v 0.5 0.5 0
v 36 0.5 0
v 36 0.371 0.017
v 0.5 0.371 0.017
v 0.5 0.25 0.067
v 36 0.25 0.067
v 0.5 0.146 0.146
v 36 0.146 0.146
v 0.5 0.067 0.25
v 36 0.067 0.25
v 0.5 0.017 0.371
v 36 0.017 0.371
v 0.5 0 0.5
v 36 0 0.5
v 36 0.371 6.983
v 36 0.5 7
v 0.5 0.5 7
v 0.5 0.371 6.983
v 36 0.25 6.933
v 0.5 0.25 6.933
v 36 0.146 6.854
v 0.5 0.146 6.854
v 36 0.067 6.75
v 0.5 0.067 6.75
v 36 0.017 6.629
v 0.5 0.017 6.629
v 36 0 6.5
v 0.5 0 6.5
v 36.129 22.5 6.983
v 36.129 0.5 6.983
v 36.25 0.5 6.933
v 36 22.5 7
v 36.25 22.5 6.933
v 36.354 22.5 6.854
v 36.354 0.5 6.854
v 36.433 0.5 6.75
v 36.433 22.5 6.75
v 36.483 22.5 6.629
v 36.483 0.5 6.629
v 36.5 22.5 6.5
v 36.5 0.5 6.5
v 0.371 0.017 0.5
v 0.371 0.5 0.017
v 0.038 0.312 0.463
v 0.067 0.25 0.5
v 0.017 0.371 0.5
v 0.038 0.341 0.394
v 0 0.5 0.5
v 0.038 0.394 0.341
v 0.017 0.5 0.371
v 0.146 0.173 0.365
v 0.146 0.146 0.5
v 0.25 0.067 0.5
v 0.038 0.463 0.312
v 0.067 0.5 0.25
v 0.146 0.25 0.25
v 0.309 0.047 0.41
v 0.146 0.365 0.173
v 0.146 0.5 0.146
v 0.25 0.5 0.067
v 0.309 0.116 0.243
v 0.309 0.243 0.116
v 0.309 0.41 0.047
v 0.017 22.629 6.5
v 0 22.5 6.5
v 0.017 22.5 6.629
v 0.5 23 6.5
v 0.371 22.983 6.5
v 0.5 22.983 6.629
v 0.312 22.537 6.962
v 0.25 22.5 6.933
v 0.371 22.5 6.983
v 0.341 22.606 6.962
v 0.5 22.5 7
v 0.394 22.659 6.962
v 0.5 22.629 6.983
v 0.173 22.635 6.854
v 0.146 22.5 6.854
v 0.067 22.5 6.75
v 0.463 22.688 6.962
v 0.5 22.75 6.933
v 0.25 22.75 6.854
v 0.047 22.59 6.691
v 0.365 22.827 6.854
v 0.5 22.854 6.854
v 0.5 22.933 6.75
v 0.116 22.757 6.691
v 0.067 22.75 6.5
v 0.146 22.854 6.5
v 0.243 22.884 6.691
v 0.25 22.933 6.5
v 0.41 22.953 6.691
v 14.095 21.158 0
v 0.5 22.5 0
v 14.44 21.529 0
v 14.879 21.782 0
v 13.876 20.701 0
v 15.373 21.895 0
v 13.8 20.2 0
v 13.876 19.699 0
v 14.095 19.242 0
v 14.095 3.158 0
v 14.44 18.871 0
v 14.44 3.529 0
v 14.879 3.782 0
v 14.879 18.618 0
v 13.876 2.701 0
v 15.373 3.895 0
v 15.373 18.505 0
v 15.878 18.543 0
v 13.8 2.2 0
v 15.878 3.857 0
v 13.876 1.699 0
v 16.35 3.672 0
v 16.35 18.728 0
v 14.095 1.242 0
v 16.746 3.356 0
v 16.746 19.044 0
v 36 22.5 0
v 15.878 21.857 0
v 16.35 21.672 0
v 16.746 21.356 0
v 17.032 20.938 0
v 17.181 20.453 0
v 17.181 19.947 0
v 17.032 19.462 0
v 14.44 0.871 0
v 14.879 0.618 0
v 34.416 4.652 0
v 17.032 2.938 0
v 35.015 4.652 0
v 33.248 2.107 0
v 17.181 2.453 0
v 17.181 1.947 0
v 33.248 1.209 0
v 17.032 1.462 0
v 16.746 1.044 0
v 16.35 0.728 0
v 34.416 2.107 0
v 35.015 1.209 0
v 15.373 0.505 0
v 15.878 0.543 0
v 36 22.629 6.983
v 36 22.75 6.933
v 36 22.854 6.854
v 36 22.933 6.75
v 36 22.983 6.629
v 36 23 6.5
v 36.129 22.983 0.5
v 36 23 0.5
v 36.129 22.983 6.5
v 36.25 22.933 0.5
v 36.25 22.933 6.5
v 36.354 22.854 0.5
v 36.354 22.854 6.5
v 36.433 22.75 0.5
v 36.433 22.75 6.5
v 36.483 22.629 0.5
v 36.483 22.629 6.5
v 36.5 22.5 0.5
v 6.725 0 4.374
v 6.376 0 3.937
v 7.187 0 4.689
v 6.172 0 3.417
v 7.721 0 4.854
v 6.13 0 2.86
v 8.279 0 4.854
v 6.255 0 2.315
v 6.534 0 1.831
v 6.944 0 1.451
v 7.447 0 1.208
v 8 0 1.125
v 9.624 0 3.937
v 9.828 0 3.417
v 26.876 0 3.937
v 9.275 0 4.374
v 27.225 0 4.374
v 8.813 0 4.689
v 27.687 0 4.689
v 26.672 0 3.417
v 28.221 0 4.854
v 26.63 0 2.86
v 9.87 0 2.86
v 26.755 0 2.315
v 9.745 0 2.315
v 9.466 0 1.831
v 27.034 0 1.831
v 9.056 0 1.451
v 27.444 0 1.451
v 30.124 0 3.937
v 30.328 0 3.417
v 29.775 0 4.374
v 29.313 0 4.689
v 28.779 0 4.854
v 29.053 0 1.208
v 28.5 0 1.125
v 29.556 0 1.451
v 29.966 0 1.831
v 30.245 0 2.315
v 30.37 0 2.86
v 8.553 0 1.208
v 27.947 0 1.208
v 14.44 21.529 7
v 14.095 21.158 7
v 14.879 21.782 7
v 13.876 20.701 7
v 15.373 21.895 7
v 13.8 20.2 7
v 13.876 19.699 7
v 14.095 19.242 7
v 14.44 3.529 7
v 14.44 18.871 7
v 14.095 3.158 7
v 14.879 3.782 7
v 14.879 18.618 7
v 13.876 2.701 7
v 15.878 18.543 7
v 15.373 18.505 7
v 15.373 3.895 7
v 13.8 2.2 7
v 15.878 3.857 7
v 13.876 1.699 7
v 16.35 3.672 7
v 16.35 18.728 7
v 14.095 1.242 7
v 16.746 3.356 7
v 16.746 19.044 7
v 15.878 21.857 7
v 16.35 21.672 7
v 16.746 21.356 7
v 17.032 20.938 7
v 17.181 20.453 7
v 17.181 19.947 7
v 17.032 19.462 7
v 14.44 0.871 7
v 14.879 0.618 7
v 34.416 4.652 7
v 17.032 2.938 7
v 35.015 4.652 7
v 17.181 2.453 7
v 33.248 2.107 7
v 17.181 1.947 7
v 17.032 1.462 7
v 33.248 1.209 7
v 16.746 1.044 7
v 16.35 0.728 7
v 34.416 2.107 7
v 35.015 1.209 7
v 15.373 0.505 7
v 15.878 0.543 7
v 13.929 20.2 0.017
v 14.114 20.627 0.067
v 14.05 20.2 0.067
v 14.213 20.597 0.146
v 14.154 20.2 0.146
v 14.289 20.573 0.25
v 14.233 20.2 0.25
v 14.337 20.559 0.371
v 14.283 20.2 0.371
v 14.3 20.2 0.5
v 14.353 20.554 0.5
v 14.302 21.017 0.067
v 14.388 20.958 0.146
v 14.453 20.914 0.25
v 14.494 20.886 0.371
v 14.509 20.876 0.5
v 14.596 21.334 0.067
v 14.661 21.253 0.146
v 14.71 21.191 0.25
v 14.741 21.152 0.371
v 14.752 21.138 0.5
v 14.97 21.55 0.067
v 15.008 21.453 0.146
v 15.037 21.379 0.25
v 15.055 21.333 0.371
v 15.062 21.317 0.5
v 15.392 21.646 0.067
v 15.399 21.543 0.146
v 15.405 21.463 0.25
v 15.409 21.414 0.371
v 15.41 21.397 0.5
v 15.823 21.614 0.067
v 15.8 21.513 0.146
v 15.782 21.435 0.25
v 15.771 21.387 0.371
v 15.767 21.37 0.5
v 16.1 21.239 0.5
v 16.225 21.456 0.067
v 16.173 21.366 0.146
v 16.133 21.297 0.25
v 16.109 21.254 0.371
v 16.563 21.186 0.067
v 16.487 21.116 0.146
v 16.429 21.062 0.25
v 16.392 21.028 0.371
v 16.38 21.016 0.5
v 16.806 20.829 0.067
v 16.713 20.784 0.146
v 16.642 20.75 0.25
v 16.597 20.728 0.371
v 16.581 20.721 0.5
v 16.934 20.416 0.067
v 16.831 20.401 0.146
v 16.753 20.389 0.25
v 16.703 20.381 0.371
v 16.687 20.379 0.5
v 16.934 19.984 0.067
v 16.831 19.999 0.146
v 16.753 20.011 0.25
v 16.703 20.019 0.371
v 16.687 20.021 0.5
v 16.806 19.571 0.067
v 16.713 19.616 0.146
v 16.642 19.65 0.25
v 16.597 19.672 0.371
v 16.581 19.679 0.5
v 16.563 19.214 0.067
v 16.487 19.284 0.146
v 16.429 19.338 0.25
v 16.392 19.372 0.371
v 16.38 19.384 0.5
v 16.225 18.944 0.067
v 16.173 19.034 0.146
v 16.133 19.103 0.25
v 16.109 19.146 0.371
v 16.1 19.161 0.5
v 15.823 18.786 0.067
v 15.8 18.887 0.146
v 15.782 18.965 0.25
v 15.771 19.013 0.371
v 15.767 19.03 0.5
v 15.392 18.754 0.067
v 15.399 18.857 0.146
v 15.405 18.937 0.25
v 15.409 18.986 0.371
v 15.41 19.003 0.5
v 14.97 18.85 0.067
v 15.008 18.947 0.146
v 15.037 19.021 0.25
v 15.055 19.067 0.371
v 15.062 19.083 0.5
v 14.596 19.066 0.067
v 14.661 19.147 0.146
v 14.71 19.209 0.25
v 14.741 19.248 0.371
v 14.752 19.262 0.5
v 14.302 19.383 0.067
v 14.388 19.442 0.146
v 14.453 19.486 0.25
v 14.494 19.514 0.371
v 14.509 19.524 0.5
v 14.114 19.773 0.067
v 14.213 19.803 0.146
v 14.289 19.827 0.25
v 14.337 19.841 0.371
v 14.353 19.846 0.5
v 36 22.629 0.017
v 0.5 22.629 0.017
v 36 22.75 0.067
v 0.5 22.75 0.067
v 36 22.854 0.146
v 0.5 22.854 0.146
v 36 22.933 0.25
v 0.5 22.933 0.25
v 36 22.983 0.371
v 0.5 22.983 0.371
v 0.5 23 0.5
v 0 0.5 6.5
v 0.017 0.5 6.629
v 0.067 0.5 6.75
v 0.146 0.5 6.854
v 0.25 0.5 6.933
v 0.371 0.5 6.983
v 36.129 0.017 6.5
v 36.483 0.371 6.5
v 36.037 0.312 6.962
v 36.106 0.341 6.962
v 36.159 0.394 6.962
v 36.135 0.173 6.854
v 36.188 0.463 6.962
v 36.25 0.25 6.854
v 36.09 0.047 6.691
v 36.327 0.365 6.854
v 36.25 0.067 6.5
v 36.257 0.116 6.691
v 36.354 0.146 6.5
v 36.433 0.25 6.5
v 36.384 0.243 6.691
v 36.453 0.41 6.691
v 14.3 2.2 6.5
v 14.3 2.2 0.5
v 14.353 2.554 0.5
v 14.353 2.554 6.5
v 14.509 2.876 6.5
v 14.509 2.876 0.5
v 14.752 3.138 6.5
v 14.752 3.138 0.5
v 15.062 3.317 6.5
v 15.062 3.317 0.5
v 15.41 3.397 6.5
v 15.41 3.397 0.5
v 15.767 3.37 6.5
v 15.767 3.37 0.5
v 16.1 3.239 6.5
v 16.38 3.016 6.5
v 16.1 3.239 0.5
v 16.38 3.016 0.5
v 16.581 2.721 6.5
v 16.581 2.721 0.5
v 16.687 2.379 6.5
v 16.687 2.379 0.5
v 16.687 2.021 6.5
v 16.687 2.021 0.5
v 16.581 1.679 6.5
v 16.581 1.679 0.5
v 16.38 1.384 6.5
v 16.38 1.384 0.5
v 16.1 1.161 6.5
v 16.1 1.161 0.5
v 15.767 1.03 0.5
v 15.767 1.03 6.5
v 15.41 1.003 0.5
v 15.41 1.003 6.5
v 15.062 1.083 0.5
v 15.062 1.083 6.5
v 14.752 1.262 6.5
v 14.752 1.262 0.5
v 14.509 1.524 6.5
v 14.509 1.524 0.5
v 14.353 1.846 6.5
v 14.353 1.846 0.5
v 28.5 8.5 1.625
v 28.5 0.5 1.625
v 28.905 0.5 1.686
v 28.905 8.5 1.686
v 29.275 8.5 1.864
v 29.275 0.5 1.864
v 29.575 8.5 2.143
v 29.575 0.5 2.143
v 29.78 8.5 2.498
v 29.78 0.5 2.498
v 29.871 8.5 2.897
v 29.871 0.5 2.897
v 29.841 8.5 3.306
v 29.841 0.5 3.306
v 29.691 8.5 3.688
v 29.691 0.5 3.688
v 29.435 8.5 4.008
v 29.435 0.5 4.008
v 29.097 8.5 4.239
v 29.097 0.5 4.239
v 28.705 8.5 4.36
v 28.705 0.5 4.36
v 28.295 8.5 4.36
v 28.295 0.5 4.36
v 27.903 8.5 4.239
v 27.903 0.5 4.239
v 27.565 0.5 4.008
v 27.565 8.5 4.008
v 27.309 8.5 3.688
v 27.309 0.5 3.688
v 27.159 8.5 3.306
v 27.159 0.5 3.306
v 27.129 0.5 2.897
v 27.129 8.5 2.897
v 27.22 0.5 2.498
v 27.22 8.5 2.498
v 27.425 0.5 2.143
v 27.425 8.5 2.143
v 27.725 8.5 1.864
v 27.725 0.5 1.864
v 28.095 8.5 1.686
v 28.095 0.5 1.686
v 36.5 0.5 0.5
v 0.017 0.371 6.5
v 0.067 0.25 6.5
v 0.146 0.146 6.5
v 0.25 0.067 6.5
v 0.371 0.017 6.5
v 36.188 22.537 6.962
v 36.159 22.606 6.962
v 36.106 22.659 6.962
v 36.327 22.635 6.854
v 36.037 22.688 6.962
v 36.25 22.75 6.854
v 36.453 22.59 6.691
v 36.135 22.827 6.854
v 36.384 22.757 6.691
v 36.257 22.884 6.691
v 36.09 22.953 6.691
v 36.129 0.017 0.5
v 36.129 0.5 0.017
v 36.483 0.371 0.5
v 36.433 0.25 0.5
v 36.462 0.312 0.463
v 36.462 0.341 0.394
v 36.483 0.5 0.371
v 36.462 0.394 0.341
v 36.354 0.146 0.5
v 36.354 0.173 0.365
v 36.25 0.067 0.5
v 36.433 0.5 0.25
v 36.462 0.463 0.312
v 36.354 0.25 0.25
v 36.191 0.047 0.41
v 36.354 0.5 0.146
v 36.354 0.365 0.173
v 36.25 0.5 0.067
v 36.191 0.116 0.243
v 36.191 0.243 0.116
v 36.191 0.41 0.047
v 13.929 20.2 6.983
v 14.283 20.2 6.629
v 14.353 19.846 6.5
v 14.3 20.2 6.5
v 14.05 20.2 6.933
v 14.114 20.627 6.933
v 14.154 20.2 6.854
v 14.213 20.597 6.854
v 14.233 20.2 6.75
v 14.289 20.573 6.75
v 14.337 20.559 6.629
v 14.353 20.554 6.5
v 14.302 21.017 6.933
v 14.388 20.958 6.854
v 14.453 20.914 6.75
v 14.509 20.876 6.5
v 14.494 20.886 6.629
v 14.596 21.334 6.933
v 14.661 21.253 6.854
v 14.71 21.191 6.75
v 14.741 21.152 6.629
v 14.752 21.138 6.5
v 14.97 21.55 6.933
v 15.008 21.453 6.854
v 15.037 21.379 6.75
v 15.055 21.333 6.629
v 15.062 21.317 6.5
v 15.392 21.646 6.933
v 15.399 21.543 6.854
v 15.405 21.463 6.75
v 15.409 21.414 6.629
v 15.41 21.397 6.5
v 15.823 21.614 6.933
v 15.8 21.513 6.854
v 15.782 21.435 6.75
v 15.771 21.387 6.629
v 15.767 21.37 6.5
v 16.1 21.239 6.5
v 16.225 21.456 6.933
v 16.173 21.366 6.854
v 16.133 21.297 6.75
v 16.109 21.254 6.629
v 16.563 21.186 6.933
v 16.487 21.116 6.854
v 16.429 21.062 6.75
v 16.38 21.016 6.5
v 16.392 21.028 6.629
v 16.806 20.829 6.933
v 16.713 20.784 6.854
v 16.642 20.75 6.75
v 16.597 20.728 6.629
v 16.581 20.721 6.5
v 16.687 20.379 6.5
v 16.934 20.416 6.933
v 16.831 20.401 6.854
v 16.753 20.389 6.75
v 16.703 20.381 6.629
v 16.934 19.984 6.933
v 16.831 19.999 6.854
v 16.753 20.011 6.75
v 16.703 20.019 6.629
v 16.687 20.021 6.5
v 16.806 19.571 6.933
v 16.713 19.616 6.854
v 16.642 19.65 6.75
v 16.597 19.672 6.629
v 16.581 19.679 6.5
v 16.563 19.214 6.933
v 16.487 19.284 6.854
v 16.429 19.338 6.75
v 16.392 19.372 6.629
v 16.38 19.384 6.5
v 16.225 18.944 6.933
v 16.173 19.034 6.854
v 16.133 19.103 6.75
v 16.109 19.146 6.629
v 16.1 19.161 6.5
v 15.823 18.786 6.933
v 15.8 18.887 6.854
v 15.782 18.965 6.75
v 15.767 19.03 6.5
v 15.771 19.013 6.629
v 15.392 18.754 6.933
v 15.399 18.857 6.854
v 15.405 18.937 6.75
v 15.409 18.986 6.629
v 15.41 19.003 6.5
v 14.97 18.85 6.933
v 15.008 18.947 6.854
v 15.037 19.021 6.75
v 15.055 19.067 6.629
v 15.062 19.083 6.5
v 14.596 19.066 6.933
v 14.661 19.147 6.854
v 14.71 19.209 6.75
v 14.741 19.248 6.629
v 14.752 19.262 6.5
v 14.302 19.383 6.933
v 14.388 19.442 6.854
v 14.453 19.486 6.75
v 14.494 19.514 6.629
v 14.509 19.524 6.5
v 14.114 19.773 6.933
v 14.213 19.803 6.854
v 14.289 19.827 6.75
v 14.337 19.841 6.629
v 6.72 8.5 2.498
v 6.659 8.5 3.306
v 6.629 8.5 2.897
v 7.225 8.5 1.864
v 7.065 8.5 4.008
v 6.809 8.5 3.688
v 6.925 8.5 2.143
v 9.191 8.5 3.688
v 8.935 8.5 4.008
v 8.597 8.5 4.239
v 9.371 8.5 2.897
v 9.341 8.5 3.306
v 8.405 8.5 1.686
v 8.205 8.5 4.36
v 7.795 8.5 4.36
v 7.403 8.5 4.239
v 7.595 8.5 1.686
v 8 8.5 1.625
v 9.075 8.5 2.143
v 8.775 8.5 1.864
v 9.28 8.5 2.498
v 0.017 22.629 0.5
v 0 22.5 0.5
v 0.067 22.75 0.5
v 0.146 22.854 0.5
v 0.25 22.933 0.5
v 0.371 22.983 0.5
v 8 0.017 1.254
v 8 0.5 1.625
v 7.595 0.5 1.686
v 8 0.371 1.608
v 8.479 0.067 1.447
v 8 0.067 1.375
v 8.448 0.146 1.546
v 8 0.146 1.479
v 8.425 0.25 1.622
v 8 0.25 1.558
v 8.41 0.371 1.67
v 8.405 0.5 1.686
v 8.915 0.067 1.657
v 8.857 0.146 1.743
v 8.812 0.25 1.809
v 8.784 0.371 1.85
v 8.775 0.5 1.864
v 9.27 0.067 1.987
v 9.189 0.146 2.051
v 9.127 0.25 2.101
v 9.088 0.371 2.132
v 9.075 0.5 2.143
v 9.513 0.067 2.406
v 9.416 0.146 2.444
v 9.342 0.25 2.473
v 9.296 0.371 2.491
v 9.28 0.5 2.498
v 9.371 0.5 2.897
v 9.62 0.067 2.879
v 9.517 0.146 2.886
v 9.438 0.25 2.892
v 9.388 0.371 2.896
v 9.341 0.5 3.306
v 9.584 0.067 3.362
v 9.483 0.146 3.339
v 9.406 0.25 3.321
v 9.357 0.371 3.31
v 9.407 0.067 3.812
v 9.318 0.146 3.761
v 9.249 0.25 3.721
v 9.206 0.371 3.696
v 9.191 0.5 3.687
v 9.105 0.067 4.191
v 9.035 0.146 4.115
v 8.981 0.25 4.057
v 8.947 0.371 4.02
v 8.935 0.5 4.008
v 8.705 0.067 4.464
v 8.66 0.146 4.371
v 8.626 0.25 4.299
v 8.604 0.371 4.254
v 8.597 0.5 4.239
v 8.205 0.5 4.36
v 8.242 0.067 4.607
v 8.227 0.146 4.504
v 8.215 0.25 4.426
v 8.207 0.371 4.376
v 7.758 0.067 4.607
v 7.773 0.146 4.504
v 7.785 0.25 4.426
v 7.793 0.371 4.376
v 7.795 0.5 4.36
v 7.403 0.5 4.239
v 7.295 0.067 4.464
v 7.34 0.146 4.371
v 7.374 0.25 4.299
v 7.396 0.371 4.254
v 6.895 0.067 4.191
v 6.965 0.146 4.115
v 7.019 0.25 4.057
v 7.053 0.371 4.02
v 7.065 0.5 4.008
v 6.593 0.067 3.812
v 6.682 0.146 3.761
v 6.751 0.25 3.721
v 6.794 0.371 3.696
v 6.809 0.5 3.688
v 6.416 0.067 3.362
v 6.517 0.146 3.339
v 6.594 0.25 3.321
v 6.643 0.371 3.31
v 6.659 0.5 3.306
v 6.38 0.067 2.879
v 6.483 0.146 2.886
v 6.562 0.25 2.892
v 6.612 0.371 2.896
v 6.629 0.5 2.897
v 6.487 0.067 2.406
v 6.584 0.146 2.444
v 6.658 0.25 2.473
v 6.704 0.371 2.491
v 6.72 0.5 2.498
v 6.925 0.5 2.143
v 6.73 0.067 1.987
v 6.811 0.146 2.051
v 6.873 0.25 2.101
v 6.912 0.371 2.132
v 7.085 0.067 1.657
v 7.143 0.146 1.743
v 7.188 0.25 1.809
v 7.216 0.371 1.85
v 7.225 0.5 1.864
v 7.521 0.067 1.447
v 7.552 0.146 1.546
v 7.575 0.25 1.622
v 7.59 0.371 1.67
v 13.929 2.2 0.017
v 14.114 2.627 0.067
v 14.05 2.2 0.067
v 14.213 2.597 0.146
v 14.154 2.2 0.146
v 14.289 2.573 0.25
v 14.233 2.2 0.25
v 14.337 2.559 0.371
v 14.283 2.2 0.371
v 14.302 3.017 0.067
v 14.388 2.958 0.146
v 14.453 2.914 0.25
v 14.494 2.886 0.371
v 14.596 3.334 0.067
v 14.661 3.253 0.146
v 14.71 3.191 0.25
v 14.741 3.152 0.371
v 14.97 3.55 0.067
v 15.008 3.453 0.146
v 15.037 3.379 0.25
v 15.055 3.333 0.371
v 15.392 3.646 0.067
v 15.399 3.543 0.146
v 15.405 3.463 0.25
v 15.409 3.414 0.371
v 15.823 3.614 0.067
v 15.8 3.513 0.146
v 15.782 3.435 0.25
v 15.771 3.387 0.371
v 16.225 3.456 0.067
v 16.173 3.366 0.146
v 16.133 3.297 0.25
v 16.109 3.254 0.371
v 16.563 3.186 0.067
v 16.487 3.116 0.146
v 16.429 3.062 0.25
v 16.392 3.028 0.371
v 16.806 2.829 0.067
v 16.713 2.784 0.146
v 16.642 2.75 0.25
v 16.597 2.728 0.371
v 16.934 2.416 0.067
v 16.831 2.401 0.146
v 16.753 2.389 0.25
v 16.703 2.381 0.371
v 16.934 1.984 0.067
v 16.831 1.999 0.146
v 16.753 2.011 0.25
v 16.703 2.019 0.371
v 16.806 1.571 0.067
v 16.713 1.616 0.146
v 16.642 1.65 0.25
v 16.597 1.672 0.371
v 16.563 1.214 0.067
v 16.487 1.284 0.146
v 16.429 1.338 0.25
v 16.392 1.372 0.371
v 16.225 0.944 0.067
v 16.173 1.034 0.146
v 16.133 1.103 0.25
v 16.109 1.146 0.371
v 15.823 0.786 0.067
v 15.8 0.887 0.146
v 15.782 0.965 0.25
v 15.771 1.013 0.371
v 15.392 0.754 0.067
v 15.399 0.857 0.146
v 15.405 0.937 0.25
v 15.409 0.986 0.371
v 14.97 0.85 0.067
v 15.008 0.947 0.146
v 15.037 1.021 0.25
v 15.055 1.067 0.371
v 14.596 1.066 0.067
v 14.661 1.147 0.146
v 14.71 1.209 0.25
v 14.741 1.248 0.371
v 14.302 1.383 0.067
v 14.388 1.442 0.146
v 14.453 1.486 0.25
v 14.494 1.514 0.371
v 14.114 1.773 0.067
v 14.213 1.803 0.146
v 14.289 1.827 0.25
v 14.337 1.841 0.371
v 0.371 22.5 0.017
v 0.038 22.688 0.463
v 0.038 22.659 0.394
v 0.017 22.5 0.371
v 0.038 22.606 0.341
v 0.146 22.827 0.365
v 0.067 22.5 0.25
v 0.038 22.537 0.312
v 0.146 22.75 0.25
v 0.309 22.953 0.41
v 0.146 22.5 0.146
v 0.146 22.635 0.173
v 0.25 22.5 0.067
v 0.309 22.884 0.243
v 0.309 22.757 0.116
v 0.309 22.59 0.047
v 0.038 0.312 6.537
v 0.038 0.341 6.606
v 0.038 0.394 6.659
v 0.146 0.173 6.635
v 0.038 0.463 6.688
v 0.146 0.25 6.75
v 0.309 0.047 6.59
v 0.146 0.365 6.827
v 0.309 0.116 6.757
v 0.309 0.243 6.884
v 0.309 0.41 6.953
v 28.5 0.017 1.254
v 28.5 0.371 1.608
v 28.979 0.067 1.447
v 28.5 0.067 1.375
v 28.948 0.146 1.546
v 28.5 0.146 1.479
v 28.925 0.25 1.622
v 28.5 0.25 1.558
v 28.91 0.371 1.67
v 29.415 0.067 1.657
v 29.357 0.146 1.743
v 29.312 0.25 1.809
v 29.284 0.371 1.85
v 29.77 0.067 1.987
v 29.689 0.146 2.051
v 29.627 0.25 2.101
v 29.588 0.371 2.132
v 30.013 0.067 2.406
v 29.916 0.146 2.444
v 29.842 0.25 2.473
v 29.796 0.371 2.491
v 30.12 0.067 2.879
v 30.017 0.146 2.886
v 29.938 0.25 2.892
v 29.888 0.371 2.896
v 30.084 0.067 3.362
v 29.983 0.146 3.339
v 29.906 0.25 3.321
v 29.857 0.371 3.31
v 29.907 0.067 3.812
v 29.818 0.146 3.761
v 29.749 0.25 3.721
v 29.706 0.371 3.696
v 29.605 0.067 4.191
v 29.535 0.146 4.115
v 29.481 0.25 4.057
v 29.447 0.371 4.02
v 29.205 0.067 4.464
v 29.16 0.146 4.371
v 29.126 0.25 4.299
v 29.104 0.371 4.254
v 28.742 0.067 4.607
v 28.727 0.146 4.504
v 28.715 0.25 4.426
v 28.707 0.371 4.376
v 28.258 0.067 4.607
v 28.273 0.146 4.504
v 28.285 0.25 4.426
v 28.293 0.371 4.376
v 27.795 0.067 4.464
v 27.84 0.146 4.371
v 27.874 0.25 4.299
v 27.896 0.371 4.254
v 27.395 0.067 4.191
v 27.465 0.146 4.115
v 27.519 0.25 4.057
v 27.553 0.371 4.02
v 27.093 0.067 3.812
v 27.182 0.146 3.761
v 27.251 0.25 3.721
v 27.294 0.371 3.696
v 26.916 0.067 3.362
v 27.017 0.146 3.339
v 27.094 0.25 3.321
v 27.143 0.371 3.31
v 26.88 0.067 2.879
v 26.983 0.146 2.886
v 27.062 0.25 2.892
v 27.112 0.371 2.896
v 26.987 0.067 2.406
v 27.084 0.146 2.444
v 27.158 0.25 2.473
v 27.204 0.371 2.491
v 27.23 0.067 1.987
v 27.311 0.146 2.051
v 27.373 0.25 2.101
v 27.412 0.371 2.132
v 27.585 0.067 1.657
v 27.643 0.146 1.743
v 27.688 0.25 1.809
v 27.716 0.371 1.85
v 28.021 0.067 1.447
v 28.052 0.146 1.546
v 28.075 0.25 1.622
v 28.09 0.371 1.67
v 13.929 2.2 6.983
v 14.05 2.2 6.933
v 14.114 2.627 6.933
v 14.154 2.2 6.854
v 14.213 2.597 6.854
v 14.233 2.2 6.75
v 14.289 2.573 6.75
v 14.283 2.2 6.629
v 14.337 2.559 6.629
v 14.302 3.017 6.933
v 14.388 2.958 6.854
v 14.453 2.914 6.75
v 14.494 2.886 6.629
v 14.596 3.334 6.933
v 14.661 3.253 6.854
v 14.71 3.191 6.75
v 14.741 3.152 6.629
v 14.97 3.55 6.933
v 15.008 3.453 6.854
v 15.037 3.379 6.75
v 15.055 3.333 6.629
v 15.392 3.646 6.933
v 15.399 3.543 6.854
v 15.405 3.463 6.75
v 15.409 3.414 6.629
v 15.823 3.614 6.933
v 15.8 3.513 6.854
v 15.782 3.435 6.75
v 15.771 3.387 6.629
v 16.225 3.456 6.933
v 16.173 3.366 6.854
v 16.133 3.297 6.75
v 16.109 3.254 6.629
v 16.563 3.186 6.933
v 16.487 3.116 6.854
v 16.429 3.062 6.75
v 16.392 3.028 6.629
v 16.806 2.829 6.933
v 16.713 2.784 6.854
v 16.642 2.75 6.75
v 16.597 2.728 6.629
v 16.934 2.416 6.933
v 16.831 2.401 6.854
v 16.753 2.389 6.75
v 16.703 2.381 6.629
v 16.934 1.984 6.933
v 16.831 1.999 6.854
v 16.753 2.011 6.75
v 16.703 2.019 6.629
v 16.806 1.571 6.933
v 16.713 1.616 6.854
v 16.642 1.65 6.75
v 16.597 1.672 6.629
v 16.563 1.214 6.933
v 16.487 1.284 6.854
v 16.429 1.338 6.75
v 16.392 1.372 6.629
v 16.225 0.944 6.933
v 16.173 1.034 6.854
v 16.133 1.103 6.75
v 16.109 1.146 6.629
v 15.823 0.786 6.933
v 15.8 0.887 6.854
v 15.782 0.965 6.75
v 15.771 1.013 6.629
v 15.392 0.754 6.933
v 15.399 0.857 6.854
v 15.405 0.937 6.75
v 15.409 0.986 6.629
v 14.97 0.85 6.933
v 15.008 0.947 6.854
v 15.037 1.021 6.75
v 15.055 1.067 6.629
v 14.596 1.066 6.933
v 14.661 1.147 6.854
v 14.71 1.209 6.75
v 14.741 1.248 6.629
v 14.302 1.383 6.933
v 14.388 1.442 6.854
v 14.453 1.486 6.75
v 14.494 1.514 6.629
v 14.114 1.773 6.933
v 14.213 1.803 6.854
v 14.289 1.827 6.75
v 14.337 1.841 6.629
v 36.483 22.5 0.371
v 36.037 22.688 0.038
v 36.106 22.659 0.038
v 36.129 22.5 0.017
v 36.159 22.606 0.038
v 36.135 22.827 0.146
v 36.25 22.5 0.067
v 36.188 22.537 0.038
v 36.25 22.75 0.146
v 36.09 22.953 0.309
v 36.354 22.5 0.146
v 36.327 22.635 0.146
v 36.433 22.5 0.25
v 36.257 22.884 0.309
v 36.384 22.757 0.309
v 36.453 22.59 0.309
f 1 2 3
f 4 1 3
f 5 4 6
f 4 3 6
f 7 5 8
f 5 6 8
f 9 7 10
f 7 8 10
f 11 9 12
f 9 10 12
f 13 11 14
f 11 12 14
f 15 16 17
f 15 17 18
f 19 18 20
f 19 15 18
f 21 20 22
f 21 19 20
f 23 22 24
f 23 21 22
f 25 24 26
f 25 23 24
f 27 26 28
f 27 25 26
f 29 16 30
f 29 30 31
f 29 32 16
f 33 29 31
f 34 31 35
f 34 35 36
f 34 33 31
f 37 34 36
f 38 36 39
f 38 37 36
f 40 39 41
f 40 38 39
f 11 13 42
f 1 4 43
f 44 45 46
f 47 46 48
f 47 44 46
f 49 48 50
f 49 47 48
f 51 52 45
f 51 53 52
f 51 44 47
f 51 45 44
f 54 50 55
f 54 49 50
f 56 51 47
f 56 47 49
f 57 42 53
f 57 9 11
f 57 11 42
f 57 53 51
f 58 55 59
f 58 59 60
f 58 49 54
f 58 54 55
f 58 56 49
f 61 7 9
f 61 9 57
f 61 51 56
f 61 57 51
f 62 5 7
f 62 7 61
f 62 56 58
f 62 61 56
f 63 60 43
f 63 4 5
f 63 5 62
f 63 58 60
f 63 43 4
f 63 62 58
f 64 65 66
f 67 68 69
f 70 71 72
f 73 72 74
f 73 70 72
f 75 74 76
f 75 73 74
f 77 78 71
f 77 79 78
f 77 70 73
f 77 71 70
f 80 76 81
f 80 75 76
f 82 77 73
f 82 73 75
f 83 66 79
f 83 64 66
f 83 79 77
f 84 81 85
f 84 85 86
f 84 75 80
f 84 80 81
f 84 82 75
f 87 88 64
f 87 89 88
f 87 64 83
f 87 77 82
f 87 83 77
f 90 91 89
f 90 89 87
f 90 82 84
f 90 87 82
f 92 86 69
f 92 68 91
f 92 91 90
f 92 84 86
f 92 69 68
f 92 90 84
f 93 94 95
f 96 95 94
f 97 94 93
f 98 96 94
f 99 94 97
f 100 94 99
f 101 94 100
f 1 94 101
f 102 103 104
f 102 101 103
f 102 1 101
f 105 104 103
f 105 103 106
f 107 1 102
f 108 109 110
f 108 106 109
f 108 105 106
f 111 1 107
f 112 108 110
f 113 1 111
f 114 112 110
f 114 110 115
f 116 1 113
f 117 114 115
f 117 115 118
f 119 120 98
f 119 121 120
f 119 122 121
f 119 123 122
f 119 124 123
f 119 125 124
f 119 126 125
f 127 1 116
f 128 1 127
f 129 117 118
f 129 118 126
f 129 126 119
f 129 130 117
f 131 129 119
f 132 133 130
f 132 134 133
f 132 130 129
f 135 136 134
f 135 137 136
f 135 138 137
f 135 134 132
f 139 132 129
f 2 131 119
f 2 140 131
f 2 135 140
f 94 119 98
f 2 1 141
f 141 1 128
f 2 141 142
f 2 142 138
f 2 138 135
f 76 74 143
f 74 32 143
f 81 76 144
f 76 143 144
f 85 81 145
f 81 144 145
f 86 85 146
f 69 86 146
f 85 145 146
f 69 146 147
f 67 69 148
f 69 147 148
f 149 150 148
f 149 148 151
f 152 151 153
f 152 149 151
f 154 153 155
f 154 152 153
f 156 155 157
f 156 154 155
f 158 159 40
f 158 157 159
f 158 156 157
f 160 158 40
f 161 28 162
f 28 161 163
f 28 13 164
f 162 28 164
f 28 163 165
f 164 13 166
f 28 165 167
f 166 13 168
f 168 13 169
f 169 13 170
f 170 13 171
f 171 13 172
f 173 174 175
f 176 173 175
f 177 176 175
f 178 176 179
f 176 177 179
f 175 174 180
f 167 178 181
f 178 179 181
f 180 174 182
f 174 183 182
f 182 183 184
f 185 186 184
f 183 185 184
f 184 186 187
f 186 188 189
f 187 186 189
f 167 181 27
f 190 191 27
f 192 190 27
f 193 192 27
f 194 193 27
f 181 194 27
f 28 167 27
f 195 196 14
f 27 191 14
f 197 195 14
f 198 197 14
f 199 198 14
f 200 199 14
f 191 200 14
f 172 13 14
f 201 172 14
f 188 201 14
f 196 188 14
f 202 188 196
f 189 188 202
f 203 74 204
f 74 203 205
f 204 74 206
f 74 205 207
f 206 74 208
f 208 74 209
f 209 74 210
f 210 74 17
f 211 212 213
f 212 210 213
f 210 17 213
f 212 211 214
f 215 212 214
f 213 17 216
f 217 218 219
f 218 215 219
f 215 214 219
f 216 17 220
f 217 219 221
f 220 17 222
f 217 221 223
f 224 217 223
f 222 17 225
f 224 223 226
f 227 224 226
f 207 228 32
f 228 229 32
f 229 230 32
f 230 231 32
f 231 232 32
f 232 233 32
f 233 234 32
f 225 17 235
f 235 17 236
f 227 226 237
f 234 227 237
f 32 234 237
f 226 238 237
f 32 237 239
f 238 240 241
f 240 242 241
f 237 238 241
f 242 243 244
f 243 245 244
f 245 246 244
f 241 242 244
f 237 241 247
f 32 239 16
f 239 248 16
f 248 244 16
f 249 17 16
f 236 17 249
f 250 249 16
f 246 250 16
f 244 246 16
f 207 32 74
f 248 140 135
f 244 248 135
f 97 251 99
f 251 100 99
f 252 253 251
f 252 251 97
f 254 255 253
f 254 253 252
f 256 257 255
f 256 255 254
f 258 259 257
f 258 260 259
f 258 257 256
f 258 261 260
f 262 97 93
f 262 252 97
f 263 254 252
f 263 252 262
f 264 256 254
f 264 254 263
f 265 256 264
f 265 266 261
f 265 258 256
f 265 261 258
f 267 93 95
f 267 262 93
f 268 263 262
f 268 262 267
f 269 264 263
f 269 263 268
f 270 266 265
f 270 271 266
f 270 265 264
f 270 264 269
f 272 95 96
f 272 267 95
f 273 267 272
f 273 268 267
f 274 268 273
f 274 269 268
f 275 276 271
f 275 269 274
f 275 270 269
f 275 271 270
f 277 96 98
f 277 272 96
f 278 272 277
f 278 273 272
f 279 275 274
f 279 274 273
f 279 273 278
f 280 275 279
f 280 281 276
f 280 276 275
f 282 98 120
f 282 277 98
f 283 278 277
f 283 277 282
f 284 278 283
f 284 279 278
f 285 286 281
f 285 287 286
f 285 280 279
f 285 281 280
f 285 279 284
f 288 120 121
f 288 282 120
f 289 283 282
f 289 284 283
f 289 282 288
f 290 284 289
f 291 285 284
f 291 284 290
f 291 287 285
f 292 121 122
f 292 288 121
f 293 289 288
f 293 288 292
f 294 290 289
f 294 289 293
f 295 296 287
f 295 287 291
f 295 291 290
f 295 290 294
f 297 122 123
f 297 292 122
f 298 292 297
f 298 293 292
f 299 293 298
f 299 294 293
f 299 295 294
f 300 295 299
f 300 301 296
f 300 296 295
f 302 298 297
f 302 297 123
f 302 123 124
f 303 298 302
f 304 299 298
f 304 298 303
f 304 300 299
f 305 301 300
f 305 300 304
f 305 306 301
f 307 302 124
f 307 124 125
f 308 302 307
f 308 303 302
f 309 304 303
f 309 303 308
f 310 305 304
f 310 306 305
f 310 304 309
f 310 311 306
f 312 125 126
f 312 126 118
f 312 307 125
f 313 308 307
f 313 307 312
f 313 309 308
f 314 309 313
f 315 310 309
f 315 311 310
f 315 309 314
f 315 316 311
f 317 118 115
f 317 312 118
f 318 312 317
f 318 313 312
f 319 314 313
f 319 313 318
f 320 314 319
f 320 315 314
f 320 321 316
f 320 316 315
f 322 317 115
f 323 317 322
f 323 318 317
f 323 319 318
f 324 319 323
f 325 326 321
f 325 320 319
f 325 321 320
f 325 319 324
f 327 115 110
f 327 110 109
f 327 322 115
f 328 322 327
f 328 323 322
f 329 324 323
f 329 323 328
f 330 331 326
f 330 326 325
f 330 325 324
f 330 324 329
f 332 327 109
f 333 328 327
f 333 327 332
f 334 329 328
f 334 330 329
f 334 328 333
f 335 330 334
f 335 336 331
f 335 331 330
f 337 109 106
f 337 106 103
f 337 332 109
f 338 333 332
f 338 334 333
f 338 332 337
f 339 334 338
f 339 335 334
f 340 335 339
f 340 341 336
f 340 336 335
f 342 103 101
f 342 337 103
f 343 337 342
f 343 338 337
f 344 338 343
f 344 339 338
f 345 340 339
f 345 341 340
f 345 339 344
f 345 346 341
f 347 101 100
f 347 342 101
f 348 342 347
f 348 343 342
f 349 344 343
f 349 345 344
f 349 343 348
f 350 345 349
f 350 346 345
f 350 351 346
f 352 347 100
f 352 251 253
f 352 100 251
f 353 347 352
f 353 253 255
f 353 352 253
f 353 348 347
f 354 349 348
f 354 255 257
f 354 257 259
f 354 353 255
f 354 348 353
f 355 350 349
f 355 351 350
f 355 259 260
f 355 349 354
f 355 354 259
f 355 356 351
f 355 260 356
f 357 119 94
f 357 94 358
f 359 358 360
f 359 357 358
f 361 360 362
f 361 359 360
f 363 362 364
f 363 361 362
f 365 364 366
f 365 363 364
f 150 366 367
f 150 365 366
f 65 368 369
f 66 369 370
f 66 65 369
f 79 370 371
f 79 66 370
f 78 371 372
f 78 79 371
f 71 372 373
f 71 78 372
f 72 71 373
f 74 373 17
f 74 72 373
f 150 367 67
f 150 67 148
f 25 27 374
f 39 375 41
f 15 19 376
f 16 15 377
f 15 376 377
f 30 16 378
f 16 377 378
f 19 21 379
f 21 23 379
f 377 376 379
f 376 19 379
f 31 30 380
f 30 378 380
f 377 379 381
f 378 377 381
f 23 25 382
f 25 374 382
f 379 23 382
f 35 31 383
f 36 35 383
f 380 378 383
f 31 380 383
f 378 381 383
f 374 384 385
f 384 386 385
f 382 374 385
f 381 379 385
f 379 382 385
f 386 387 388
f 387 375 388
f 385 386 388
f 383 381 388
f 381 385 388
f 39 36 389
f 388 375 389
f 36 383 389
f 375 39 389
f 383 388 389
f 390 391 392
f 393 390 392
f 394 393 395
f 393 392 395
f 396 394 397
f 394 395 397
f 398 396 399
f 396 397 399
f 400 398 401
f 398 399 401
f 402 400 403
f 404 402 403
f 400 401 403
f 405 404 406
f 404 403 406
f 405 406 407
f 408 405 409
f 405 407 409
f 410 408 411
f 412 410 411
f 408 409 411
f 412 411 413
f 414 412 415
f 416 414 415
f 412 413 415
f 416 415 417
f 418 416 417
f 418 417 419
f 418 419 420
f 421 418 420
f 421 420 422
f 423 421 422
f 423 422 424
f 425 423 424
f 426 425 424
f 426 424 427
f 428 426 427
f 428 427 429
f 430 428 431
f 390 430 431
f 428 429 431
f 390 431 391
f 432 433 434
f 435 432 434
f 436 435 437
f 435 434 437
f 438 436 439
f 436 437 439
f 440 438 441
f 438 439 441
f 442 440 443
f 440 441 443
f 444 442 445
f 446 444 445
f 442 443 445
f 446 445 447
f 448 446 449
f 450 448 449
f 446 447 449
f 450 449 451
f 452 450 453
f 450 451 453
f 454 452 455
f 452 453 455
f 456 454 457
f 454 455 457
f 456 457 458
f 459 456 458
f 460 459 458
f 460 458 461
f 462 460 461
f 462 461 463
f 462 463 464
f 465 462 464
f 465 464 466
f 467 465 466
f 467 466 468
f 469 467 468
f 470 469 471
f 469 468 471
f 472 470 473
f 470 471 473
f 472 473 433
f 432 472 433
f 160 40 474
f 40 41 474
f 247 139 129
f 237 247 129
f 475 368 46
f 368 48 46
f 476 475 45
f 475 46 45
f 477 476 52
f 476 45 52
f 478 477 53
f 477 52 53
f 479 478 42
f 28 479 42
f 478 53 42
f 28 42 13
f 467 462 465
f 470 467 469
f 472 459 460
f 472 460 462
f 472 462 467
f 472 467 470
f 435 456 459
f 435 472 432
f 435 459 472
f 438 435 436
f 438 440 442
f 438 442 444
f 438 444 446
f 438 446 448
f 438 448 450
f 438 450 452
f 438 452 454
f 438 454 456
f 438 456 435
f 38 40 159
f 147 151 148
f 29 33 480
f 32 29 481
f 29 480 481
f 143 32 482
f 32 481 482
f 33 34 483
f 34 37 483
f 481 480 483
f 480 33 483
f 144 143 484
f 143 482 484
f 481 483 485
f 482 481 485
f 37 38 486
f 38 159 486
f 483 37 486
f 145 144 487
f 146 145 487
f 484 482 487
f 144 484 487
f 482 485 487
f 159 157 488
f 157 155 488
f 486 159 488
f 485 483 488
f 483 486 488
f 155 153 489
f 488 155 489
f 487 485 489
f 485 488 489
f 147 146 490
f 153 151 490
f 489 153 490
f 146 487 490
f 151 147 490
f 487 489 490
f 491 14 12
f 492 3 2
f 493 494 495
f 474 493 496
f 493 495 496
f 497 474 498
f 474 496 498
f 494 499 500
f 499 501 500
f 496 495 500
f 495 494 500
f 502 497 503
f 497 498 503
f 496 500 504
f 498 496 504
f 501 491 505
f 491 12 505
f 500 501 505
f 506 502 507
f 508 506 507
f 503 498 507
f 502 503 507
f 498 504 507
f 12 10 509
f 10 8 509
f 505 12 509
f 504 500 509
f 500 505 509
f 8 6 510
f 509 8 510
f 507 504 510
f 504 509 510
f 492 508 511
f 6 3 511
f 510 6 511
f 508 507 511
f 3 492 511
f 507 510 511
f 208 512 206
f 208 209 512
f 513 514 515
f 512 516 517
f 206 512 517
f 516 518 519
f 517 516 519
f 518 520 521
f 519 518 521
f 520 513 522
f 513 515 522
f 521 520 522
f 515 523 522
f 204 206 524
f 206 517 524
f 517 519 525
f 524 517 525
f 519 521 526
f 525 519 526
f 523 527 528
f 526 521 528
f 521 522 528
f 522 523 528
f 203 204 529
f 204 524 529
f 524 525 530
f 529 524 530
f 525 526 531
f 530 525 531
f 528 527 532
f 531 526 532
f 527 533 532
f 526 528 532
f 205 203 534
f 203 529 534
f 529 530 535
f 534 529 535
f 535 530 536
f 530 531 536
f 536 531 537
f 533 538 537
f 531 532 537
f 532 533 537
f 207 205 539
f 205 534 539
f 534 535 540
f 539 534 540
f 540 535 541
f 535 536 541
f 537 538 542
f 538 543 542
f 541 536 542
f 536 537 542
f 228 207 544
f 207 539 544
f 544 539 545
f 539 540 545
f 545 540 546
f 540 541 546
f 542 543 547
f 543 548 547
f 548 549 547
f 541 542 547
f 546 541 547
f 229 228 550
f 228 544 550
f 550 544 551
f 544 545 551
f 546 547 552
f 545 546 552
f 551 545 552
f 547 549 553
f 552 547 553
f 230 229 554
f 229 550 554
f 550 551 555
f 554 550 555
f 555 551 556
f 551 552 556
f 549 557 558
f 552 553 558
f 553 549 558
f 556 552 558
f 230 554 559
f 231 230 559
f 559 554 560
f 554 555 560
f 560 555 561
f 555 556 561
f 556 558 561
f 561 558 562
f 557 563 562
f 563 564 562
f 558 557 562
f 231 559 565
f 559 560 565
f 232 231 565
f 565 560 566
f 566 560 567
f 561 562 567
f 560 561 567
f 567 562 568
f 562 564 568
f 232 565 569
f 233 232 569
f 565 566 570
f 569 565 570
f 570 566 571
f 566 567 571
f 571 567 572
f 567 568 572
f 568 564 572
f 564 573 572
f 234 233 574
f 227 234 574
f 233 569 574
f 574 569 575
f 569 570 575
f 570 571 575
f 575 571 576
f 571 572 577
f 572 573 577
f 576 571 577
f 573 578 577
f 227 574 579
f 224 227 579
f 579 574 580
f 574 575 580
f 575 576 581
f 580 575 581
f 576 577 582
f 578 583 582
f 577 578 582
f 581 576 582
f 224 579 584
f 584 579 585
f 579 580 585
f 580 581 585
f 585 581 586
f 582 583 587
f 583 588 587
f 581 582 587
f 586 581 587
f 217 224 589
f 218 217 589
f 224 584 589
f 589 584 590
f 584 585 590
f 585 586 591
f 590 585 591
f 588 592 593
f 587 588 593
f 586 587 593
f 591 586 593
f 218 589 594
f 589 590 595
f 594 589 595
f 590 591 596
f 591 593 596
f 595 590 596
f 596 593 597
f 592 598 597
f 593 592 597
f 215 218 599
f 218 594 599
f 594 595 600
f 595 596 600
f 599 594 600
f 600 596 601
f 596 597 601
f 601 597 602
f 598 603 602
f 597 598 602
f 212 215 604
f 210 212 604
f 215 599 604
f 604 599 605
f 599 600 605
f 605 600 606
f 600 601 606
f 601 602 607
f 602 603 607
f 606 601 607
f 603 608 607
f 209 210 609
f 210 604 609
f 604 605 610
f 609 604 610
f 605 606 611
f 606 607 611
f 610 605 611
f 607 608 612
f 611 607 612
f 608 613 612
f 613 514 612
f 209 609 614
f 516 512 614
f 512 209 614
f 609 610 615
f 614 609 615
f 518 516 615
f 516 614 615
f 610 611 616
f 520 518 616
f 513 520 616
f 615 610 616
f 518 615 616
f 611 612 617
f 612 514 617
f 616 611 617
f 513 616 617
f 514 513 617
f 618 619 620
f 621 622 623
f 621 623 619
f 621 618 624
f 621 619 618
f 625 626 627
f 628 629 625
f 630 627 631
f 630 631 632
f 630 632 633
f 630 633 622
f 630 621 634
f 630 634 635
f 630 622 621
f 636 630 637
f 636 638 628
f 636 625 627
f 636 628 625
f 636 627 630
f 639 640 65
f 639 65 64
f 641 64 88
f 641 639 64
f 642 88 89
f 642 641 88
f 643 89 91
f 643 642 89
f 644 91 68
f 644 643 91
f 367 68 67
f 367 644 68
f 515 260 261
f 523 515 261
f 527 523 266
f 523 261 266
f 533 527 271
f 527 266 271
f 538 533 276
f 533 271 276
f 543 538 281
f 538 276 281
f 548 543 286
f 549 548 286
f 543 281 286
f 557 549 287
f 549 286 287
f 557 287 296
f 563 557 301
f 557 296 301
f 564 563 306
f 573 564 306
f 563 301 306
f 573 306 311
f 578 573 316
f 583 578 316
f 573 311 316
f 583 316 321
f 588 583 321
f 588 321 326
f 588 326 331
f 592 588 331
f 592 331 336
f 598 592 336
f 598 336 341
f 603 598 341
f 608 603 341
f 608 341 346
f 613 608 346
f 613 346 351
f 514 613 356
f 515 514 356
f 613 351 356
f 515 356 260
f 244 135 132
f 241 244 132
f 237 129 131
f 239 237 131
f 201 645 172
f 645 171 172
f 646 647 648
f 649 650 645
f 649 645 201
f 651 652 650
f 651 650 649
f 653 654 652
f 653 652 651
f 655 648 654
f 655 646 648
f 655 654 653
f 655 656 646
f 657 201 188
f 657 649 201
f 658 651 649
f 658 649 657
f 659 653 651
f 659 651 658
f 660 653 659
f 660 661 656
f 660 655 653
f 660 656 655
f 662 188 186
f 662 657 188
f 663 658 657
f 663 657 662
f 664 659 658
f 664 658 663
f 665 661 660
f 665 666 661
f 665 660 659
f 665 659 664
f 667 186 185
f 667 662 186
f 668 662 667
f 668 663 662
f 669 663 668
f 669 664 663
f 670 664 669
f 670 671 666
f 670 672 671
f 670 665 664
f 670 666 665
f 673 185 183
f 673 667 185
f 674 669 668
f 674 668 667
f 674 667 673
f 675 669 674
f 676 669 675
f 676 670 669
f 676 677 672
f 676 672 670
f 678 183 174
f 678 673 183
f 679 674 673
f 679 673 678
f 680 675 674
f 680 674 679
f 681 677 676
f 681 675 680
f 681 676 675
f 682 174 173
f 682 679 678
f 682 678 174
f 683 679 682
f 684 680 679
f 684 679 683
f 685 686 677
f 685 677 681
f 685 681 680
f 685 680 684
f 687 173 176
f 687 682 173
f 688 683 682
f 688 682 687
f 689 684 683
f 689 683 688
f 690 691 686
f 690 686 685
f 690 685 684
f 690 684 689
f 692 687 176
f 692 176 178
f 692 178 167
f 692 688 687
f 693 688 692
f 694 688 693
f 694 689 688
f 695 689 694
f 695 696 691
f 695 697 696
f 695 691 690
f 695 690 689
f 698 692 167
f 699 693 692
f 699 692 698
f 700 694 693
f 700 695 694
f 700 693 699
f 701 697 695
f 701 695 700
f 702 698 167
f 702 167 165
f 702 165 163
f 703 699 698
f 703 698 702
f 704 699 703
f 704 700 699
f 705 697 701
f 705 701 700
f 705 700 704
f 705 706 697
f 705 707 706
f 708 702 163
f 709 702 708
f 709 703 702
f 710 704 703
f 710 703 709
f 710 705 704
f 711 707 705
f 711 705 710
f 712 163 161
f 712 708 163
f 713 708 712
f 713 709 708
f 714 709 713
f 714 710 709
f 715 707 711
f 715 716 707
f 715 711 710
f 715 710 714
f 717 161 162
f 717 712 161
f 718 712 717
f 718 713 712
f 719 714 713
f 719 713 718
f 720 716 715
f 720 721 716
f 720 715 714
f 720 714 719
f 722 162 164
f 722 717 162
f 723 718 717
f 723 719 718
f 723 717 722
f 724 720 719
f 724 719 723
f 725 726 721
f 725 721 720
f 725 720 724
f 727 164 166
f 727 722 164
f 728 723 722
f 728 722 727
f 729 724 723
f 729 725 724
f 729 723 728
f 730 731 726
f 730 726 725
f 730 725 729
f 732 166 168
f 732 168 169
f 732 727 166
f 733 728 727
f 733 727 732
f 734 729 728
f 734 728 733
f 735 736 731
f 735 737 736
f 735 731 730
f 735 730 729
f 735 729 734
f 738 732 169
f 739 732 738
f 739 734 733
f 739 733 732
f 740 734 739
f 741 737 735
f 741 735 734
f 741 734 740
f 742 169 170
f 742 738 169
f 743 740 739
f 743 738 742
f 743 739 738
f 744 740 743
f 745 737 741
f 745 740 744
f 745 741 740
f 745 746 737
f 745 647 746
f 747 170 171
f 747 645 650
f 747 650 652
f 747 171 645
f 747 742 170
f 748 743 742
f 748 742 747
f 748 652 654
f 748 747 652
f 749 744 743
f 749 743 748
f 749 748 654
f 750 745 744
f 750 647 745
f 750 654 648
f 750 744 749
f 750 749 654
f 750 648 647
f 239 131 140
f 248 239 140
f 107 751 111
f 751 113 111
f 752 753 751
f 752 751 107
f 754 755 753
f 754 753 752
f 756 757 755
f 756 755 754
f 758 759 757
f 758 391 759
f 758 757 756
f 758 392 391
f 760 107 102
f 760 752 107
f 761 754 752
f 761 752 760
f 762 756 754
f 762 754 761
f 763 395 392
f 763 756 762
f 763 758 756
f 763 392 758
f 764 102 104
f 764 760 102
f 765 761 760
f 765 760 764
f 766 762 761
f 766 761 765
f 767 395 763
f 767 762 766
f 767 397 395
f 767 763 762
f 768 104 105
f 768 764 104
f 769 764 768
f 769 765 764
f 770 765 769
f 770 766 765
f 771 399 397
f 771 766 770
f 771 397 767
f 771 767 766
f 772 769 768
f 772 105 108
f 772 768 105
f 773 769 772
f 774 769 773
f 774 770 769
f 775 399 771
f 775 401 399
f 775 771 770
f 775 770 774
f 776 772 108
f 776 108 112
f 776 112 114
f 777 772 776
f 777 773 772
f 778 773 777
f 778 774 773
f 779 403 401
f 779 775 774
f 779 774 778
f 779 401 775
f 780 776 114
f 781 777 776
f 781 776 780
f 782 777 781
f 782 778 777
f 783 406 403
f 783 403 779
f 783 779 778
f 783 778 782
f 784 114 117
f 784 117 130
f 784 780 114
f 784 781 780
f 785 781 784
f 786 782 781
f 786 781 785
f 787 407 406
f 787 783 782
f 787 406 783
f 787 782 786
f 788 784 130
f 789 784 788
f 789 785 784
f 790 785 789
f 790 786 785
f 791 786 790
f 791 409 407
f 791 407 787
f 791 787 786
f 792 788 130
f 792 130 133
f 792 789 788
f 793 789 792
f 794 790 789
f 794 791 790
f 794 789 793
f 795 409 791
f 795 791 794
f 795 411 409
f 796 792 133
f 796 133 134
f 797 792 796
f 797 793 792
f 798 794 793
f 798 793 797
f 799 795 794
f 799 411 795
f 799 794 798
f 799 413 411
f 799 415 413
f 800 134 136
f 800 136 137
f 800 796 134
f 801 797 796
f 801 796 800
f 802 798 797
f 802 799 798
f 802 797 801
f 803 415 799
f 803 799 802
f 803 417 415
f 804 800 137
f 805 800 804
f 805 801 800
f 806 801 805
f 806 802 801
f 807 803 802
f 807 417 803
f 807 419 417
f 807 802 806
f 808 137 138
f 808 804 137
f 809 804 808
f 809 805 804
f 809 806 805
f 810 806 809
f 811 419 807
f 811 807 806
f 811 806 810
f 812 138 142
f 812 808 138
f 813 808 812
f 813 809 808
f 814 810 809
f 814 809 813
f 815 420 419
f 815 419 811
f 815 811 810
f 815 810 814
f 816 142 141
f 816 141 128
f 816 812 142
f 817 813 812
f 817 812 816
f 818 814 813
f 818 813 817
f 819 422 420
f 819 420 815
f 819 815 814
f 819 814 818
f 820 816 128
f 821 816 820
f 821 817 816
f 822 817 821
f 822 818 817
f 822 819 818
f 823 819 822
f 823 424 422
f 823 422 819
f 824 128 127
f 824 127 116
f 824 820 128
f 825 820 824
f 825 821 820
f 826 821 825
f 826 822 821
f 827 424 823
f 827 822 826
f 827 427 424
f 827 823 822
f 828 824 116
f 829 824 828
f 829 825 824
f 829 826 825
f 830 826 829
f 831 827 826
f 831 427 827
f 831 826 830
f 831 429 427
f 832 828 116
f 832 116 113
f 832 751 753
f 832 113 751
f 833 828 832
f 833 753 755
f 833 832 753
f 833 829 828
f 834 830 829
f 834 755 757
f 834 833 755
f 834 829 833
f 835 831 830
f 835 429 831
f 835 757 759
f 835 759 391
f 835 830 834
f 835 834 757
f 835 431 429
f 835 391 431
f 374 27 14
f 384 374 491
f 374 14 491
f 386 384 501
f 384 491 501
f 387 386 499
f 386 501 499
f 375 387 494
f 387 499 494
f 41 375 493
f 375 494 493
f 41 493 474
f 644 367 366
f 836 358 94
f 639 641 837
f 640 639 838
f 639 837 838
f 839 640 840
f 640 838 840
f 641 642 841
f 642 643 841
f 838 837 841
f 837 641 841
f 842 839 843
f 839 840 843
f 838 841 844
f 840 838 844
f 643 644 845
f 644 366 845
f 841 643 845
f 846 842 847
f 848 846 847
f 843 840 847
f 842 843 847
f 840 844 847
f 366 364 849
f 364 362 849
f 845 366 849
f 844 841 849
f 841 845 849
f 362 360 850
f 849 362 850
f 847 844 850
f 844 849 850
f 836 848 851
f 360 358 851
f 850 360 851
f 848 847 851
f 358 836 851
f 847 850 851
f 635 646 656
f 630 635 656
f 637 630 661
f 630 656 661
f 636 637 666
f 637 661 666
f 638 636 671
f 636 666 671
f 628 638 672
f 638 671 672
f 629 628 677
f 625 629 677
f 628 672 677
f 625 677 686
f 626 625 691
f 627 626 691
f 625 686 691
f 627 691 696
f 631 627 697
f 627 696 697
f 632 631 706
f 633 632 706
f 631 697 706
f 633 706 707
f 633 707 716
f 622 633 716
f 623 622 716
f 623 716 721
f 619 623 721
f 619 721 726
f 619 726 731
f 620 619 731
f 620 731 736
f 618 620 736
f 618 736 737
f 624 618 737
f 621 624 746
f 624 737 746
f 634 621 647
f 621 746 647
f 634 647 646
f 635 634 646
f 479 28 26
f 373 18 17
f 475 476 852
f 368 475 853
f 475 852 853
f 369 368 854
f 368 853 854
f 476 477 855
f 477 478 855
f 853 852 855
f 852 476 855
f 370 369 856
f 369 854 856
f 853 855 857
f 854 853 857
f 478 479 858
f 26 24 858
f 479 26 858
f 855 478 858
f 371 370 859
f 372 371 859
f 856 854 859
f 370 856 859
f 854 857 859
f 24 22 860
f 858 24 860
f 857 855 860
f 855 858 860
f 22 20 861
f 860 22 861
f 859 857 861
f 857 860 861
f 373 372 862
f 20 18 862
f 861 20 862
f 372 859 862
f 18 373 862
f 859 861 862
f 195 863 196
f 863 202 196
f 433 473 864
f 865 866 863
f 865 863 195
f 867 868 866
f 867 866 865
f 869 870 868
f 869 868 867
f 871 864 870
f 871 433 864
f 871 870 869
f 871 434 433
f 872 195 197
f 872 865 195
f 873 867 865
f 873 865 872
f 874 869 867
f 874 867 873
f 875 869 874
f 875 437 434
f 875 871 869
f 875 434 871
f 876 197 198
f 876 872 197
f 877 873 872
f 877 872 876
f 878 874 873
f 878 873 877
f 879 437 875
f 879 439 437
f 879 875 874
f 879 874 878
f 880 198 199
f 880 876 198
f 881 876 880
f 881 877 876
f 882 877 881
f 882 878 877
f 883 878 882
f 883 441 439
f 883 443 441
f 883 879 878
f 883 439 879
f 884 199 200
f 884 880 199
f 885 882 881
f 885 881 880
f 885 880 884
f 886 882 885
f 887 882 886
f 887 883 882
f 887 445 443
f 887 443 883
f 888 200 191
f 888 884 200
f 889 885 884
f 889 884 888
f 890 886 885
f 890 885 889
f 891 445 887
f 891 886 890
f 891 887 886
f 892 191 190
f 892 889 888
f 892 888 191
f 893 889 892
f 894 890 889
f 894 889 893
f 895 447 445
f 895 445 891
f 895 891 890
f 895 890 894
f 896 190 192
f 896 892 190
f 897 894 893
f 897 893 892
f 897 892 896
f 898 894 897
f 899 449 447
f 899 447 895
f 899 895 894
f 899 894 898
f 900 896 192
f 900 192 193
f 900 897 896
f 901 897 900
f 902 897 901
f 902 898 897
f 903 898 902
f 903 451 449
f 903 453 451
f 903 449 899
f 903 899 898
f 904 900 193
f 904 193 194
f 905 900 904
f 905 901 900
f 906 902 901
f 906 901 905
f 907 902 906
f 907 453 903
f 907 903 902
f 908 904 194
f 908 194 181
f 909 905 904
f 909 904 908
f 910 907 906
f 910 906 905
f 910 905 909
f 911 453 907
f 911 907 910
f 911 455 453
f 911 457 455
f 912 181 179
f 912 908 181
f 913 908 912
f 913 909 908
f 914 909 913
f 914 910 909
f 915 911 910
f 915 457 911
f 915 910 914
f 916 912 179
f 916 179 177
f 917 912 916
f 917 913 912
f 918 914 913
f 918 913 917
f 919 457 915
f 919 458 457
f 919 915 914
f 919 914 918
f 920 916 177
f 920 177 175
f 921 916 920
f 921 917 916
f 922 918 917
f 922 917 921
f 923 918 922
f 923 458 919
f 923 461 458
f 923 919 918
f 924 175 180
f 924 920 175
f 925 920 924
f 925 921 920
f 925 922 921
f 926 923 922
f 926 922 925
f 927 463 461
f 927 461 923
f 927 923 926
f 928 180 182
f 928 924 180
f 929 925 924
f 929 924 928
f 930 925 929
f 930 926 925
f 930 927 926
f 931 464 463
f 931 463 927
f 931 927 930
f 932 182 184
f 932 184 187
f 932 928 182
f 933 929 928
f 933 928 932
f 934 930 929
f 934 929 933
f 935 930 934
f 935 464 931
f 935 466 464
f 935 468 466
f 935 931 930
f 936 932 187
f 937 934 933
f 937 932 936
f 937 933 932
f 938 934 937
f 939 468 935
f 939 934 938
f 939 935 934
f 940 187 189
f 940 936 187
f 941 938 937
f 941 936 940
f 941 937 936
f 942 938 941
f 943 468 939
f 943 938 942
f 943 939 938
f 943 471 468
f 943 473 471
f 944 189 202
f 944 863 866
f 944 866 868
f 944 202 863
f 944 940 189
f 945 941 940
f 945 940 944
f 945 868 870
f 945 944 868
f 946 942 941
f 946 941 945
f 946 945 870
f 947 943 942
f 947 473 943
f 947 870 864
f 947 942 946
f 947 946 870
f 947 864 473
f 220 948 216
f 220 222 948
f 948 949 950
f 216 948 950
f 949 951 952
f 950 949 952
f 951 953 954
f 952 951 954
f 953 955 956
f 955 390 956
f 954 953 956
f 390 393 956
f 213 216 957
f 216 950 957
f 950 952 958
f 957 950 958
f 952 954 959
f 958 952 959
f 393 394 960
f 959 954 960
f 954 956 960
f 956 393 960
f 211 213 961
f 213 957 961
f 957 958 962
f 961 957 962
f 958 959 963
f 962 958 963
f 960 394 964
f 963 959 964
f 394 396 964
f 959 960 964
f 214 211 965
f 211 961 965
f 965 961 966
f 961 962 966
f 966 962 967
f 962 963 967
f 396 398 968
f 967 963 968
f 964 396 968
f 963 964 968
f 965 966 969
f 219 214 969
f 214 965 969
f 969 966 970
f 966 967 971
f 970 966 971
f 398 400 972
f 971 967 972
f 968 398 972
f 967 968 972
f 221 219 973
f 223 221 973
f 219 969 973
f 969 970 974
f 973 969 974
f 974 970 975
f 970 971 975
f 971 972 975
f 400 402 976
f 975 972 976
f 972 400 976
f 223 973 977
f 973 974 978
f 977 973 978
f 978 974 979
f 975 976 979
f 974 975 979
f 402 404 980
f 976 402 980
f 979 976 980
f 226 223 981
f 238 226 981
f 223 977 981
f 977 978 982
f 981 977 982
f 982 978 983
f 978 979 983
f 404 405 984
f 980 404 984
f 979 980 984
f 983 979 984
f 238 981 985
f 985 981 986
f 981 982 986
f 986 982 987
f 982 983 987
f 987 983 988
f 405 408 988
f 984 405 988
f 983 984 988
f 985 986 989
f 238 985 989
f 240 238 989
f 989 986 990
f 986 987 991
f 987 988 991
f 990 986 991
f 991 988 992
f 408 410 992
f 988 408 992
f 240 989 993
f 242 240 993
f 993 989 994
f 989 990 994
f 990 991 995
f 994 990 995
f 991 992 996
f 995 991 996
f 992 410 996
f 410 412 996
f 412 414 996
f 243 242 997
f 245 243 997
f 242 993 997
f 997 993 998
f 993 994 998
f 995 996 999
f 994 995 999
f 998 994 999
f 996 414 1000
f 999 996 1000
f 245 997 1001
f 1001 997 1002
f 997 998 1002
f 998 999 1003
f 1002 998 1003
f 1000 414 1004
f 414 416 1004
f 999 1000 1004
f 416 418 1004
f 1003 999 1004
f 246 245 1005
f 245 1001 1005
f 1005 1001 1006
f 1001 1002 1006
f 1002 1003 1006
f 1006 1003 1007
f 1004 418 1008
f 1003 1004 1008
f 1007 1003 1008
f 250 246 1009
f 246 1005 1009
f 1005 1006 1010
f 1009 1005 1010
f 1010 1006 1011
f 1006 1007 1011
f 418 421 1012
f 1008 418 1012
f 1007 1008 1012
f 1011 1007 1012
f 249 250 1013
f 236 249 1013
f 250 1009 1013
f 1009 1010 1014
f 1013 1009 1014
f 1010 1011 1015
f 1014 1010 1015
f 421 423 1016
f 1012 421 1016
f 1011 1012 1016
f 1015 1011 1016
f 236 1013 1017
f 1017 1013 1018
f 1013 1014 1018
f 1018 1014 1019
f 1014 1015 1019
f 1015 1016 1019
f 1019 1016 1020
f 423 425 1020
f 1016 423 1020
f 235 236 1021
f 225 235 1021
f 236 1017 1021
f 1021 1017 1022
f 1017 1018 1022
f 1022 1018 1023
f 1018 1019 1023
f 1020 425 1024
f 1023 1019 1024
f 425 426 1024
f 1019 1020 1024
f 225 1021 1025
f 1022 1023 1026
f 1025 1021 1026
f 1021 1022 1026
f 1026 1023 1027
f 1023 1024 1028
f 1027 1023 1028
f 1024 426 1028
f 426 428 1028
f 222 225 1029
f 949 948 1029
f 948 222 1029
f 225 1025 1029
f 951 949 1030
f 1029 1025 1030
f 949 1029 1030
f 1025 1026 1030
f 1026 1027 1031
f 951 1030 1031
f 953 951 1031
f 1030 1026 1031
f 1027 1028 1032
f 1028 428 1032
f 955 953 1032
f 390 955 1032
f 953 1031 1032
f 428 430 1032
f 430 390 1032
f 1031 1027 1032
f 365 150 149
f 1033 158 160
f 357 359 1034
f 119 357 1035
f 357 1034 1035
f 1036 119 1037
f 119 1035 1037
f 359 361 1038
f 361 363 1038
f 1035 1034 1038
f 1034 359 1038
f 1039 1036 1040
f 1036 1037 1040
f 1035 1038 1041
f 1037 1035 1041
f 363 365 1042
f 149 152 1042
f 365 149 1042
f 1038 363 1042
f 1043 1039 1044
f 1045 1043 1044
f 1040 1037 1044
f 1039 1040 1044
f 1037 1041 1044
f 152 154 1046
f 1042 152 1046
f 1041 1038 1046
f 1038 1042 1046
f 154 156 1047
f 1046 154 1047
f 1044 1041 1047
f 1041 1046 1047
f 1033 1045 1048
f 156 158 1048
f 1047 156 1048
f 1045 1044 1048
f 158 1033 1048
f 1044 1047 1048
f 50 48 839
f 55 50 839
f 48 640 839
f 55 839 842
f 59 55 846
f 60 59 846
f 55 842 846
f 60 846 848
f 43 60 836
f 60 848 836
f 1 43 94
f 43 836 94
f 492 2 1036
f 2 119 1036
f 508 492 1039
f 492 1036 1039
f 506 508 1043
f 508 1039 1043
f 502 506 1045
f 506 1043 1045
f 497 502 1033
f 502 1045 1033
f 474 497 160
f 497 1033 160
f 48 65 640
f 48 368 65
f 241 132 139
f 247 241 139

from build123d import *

# Parameters (mm, degrees)
SKETCH1_W           = 36.5
SKETCH1_H           = 7
BOSS_EXTRUDE1_DEPTH = 23
SKETCH2_R           = 1.375
CUT_EXTRUDE1_DEPTH  = 8.5
SKETCH4_R           = 1.2
CUT_EXTRUDE2_DEPTH  = 7
FILLET1_R           = 0.5
CUT_EXTRUDE3_DEPTH  = 44.706406853


with BuildPart() as part:
    # Sketch1 → Boss-Extrude1 (new body)
    with BuildSketch(Plane(origin=(0, 0, 0), x_dir=(1, 0, 0), z_dir=(0, 1, 0))):
        with Locations((18.25, -3.5)):
            Rectangle(SKETCH1_W, SKETCH1_H)
    extrude(amount=BOSS_EXTRUDE1_DEPTH)

    # Sketch2 → Cut-Extrude1 (cut)
    with BuildSketch(Plane.XZ):
        with Locations(Location((8, 3, 0), (0, 0, 270))):
            Circle(SKETCH2_R)
        with Locations(Location((28.5, 3, 0), (0, 0, 270))):
            Circle(SKETCH2_R)
    extrude(amount=-CUT_EXTRUDE1_DEPTH, mode=Mode.SUBTRACT)

    # Sketch4 → Cut-Extrude2 (cut)
    with BuildSketch(Plane(origin=(0, 0, 0), x_dir=(-1, 0, 0), z_dir=(0, 0, -1))):
        with Locations((-15.5, 2.2)):
            Circle(SKETCH4_R)
        with Locations((-15.5, 20.2)):
            Circle(SKETCH4_R)
    extrude(amount=-CUT_EXTRUDE2_DEPTH, mode=Mode.SUBTRACT)

    # Fillet1
    fillet1_edges = [part.edges().sort_by_distance(p)[0] for p in [
        (36.5, 23, 3.5),
        (8, 0, 4.375),
        (18.25, 23, 0),
        (28.5, 0, 4.375),
        (16.7, 2.2, 7),
        (16.7, 2.2, 0),
        (16.7, 20.2, 7),
        (16.7, 20.2, 0),
        (0, 23, 3.5),
        (18.25, 0, 0),
        (36.5, 0, 3.5),
        (18.25, 0, 7),
        (0, 0, 3.5),
        (0, 11.5, 0),
        (36.5, 11.5, 0),
        (36.5, 11.5, 7),
        (0, 11.5, 7),
        (18.25, 23, 7),
    ]]
    fillet(fillet1_edges, radius=FILLET1_R - 0.0001)  # a hair under: the kernel refuses the full size

    # Sketch5 → Cut-Extrude3 (cut, through all)
    with BuildSketch(Plane(origin=(0, 0, 0), x_dir=(-1, 0, 0), z_dir=(0, 0, -1))):
        Polygon((-35.01478763, 4.65210946), (-35.01478763, 1.209340572), (-33.248497505, 1.209340572), (-33.248497505, 2.107454195), (-34.416045215, 2.107454195), (-34.416045215, 4.65210946), align=None)
    extrude(amount=-CUT_EXTRUDE3_DEPTH, mode=Mode.SUBTRACT)


solid = part.part
